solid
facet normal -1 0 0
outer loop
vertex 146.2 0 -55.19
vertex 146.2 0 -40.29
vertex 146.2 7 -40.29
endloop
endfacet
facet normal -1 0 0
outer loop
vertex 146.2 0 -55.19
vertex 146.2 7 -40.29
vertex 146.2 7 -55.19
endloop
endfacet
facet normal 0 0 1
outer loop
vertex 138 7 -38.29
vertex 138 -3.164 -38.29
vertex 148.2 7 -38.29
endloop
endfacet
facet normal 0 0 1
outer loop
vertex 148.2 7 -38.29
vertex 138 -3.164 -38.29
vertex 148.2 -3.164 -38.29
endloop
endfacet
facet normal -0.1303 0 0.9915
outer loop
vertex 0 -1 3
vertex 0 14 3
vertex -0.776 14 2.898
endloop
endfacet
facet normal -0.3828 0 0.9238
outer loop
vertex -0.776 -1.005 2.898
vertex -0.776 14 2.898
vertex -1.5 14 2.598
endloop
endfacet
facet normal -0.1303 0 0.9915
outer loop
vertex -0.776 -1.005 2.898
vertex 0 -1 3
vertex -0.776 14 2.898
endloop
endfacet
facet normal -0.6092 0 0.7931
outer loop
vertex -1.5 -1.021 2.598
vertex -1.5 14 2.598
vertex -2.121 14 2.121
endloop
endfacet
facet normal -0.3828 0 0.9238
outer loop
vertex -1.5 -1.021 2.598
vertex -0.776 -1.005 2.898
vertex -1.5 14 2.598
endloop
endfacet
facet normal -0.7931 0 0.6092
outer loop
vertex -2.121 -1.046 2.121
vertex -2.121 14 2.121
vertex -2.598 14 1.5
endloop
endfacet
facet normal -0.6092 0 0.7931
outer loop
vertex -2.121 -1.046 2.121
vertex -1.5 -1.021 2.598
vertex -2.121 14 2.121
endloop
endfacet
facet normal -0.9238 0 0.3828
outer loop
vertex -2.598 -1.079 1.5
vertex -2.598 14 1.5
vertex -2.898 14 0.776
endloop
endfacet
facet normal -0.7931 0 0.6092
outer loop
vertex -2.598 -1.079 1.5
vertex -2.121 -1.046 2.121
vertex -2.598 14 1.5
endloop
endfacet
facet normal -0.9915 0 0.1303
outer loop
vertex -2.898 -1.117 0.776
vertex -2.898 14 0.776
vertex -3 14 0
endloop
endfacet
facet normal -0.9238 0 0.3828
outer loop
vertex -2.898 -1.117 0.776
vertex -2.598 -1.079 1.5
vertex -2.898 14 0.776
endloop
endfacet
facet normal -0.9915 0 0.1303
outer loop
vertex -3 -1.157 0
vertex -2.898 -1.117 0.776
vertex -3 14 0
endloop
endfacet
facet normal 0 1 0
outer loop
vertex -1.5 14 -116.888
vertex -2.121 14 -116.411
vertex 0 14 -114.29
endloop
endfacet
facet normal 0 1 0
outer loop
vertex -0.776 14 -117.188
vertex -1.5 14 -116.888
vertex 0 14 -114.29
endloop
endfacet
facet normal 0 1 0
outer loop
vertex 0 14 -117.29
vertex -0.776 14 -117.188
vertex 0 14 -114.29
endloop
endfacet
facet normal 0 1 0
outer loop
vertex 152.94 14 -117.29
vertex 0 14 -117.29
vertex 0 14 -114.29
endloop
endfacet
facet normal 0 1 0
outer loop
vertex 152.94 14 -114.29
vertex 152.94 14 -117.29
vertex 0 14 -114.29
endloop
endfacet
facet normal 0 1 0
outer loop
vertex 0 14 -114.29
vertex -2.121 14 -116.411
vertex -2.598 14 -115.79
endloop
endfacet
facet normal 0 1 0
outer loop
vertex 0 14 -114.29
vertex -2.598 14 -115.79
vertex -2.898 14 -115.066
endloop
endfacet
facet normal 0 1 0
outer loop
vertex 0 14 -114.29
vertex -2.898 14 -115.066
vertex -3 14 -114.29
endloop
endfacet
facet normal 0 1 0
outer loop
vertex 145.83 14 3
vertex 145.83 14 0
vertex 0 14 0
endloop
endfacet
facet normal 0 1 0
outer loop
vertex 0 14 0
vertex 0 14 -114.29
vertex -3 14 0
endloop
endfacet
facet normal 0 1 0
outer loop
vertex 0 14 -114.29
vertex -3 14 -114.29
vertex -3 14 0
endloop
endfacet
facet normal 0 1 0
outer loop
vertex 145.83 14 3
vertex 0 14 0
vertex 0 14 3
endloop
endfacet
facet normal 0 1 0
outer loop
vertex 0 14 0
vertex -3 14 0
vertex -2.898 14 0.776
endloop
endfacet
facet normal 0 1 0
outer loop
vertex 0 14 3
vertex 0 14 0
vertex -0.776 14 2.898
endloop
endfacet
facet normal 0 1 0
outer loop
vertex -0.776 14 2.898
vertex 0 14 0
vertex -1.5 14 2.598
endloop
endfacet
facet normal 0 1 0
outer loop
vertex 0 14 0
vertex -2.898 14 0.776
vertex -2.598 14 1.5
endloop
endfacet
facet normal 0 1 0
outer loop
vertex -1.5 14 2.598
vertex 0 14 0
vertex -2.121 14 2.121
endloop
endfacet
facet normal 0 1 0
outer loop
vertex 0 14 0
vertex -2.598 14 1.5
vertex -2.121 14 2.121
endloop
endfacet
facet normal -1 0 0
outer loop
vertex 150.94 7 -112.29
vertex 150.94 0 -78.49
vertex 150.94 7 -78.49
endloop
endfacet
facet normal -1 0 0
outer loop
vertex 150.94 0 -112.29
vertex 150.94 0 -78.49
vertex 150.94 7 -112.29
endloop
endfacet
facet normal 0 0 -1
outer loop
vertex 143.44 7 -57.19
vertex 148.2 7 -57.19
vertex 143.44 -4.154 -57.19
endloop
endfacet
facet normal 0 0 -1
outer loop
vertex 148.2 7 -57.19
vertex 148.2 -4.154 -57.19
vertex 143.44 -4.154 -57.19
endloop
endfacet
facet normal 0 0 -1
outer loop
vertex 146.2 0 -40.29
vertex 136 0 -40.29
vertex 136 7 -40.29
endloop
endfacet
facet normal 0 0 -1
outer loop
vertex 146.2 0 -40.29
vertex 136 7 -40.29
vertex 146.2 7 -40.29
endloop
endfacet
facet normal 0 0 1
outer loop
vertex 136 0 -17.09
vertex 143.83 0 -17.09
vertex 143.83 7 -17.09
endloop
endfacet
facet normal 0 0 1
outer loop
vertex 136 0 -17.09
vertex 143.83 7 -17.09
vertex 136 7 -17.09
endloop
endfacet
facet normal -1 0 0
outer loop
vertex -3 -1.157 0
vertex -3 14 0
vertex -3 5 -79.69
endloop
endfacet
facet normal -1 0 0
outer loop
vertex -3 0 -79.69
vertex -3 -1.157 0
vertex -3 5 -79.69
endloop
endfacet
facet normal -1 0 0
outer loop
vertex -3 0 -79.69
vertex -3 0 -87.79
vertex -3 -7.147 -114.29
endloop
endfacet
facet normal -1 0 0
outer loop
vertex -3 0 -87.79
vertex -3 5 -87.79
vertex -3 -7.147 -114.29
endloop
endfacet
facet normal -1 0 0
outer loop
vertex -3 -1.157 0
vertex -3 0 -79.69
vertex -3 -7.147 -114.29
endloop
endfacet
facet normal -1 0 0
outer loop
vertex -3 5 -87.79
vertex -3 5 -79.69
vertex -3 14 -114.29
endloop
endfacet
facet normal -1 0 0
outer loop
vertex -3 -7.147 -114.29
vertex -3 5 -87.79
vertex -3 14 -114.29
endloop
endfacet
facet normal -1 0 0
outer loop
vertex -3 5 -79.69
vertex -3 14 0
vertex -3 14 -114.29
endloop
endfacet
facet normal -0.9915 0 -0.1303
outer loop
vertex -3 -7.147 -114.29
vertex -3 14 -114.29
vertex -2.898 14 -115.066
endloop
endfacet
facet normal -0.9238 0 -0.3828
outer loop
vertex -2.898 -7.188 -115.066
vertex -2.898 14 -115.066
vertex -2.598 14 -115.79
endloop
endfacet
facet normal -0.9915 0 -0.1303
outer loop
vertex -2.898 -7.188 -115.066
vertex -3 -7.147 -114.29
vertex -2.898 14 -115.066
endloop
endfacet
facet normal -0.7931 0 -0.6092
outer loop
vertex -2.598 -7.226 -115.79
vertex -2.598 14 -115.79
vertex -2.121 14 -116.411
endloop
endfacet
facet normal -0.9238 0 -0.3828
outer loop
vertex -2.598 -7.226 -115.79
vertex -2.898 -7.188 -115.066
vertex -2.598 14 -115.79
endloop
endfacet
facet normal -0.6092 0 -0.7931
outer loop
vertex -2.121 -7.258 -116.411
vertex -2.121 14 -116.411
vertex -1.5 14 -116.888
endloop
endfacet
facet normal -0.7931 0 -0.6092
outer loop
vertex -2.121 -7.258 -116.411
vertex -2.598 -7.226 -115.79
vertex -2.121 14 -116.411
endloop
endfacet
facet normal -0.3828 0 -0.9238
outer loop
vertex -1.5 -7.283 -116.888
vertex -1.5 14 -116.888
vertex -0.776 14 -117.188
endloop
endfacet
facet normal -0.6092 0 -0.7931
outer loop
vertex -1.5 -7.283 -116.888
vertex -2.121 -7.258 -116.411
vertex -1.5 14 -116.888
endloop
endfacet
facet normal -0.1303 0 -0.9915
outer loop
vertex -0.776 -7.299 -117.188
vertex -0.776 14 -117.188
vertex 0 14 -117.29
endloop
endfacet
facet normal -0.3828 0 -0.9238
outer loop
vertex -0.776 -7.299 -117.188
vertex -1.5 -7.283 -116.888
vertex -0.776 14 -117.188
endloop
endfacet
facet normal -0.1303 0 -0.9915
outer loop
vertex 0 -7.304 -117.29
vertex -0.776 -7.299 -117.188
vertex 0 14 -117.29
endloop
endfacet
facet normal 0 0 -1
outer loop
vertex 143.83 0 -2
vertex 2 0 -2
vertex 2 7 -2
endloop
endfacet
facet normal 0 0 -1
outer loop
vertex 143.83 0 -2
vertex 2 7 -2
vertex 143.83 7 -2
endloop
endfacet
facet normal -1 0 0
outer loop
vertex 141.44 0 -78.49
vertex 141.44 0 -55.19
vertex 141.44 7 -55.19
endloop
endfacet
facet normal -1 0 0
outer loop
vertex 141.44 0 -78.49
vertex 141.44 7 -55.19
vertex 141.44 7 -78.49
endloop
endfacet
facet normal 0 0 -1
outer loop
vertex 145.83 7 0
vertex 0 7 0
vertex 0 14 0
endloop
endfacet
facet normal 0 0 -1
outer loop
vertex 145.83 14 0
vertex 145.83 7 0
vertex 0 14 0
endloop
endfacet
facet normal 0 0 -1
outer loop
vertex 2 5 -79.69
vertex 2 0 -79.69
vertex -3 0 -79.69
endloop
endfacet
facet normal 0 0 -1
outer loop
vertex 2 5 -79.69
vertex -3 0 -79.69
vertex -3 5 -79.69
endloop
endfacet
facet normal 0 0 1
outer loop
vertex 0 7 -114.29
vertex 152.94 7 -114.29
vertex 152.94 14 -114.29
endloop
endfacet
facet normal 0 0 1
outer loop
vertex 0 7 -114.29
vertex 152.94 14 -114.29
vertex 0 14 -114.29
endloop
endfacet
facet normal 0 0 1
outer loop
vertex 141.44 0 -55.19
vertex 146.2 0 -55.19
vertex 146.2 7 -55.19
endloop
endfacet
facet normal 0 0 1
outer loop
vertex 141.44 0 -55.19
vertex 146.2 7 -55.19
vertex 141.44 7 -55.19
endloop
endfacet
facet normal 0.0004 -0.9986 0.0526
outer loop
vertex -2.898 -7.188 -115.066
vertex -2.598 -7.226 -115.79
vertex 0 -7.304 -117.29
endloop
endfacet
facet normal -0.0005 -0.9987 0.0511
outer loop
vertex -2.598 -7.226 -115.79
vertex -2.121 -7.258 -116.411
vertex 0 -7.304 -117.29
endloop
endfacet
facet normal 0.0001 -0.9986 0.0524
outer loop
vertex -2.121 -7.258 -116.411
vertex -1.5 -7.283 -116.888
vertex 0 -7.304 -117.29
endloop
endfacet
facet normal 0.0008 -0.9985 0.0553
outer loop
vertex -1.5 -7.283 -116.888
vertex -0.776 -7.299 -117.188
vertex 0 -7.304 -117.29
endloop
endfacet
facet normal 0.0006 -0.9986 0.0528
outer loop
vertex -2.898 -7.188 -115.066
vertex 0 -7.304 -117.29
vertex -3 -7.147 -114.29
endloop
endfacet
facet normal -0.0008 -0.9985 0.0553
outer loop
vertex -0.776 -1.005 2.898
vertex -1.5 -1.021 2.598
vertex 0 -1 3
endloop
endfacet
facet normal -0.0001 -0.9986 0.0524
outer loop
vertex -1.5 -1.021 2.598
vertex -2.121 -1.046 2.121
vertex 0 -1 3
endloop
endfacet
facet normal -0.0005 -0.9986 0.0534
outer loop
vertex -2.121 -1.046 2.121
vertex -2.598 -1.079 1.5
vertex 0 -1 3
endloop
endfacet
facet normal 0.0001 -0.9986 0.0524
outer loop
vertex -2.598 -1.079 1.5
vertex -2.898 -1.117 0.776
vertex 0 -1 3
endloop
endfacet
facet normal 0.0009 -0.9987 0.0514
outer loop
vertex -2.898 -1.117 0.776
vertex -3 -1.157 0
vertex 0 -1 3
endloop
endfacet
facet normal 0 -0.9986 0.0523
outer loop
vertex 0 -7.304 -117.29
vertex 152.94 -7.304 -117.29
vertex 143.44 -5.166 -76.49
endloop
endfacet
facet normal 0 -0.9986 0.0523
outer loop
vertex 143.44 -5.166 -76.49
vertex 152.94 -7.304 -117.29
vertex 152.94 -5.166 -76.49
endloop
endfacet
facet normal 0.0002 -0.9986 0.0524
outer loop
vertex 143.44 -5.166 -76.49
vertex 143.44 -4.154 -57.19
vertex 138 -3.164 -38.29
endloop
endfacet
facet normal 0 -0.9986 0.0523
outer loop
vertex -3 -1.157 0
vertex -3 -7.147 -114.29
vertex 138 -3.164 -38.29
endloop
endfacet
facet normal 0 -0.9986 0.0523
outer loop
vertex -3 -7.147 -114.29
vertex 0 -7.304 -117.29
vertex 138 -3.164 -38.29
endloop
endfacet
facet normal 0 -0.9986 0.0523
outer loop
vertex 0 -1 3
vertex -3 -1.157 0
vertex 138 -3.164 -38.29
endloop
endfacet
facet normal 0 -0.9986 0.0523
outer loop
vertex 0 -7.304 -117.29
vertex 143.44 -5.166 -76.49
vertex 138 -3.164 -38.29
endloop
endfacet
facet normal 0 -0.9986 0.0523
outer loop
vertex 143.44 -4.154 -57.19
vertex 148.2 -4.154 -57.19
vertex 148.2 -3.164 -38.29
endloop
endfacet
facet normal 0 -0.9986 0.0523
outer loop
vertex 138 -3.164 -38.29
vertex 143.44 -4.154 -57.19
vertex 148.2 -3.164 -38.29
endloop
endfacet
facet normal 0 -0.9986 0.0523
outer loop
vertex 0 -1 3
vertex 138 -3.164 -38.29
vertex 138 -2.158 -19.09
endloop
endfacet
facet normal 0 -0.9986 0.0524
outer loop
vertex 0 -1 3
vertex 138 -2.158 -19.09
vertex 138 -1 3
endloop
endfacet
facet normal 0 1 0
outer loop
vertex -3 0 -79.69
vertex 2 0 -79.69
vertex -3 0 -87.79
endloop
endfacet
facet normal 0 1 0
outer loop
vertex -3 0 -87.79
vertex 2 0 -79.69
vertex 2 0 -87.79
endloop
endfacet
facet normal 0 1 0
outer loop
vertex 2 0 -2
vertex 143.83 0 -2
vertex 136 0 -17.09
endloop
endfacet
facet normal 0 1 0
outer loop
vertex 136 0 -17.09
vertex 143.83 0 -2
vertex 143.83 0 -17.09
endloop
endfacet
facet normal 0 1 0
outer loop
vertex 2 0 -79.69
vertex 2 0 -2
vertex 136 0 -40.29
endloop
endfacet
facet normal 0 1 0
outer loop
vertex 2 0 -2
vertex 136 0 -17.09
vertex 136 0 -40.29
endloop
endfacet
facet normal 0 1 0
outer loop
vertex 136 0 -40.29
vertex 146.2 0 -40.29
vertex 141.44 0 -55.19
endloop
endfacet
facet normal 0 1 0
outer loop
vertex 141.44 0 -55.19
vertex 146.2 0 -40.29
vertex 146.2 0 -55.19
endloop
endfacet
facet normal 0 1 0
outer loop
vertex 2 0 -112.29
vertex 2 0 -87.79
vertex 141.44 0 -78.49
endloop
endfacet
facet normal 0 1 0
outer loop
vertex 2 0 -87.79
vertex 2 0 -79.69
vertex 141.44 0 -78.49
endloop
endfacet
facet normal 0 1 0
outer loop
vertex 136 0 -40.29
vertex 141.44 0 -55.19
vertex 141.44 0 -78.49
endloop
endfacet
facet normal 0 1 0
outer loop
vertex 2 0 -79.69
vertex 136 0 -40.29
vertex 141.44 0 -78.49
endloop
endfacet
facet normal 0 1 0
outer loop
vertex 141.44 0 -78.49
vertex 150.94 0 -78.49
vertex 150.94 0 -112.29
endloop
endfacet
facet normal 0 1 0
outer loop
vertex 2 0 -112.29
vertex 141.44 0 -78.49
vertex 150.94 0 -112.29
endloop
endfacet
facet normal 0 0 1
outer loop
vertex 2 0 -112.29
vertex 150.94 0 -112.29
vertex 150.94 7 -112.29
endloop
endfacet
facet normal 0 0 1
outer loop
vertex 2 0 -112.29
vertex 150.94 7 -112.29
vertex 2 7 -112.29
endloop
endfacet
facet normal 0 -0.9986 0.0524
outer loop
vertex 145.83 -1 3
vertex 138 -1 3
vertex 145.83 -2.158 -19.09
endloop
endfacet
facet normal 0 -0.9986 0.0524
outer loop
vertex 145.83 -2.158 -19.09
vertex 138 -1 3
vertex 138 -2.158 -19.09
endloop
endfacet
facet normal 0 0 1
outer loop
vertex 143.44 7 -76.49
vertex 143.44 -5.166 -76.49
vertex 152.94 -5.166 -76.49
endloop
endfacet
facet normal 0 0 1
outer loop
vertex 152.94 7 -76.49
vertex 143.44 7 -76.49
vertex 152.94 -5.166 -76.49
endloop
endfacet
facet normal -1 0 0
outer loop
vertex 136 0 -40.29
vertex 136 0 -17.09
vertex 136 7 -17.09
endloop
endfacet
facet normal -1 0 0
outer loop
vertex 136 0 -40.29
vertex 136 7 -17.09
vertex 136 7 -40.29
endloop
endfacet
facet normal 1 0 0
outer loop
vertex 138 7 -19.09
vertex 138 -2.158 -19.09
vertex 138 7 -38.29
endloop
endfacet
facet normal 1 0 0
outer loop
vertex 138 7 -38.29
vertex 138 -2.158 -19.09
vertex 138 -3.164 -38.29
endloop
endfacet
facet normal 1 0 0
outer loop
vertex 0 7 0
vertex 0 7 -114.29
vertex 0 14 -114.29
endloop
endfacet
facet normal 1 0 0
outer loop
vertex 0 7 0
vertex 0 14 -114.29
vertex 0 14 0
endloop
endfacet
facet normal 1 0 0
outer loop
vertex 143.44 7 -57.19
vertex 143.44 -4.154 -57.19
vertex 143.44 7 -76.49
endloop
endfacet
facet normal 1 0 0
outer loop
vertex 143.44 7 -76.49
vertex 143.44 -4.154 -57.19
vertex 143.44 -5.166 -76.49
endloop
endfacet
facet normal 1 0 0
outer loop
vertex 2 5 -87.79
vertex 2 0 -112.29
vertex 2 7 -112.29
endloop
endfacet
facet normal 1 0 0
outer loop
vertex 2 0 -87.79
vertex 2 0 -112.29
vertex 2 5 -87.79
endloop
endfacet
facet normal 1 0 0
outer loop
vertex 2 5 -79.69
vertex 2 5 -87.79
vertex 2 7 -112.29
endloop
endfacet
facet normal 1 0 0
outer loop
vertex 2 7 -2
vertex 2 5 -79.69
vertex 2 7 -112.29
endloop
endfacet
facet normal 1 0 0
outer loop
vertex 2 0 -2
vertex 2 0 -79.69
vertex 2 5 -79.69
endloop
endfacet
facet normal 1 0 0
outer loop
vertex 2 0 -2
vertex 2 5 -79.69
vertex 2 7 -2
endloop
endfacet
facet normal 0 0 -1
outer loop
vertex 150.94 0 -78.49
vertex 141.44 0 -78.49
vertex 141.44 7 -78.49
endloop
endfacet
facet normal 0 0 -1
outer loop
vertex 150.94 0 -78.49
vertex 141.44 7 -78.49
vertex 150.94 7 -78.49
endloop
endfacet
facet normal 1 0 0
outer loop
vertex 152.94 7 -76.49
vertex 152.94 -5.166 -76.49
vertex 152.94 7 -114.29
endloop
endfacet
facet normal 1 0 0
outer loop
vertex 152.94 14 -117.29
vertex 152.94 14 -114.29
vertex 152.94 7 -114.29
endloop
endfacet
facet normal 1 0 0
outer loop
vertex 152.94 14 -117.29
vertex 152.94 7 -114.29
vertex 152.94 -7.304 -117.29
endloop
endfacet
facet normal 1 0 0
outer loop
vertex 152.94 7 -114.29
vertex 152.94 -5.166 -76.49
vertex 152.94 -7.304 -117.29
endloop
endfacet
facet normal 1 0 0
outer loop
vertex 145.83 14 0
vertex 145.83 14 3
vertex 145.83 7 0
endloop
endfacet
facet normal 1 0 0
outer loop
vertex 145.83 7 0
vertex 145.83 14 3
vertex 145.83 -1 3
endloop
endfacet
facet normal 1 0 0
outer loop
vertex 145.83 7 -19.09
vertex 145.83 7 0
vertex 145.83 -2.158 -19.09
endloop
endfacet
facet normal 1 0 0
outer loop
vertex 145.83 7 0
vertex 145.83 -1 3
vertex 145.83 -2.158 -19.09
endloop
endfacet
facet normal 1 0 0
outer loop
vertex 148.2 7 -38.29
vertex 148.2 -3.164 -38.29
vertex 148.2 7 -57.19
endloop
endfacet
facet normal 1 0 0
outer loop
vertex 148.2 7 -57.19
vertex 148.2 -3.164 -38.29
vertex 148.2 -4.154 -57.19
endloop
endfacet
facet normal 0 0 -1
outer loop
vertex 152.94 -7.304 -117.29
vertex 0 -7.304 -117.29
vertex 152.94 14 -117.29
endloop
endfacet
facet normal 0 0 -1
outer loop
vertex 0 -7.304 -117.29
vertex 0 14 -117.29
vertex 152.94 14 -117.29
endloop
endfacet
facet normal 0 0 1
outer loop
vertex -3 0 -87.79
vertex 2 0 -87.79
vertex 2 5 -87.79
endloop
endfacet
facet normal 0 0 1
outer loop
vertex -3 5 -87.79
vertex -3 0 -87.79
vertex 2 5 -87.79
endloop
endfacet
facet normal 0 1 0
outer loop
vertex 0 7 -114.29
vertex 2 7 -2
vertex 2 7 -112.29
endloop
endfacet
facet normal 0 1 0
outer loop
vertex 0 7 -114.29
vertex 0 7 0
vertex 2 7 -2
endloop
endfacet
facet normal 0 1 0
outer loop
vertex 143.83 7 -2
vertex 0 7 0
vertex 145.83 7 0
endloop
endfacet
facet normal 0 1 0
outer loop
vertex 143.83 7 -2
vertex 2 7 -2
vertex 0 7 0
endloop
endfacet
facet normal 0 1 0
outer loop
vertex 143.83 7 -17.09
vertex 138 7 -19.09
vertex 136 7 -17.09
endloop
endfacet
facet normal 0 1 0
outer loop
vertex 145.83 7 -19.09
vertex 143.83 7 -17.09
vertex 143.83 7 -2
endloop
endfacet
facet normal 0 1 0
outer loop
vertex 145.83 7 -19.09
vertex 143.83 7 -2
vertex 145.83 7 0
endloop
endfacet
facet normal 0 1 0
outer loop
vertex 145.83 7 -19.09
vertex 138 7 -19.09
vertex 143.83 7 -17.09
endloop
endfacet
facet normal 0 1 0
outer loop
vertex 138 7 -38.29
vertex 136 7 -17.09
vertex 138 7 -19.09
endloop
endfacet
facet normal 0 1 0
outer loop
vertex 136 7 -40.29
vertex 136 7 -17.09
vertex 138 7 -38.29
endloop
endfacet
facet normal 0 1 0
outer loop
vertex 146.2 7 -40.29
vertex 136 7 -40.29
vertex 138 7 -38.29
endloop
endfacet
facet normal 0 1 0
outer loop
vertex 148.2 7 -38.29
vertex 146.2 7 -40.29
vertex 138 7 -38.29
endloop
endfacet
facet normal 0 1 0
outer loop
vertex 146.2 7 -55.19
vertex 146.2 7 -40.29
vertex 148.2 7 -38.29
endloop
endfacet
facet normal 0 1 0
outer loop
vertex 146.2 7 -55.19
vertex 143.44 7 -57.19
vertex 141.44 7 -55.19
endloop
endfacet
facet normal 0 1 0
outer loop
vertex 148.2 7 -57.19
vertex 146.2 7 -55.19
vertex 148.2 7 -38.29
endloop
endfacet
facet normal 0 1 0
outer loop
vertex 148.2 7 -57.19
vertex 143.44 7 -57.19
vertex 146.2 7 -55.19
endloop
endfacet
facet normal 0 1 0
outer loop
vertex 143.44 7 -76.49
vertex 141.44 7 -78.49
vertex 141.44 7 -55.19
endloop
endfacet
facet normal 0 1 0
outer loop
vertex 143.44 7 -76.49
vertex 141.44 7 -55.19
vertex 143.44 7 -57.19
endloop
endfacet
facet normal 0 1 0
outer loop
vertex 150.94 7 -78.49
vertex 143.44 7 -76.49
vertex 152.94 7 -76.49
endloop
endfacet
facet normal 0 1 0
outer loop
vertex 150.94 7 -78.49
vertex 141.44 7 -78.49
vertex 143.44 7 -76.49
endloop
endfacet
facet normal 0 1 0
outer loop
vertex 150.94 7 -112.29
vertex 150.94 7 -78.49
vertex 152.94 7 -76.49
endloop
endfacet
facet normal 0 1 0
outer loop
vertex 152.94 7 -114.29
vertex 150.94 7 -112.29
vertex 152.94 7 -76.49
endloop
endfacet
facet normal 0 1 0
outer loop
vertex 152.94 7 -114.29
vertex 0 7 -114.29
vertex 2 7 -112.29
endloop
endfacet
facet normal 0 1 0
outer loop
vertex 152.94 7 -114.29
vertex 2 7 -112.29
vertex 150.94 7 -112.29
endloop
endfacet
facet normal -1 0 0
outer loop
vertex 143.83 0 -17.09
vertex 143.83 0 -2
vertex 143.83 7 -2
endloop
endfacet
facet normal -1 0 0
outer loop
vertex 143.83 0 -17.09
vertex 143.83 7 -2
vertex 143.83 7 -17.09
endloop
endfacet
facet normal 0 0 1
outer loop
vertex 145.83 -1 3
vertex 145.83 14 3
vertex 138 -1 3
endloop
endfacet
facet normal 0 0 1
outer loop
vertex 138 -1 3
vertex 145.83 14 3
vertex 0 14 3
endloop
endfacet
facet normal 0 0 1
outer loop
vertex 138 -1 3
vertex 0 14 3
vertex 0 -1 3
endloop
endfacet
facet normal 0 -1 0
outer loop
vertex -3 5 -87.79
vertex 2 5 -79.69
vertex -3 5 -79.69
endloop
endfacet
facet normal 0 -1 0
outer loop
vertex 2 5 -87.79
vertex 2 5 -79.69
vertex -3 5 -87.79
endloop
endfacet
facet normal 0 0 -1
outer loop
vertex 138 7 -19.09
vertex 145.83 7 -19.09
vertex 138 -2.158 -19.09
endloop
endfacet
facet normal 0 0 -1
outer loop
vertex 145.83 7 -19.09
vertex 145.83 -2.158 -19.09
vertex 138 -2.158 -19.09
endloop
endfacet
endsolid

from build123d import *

# Parameters (mm, degrees)
BOSS_EXTRUDE1_DEPTH = 14
BOSS_EXTRUDE2_DEPTH = 1
BOSS_EXTRUDE3_DEPTH = 155.94
SKETCH1_5_W         = 14.94
SKETCH1_5_H         = 3
CUT_EXTRUDE1_DEPTH  = 10
BOSS_EXTRUDE4_DEPTH = 7.83
FILLET1_R           = 3
BOSS_EXTRUDE5_DEPTH = 7
SKETCH5_W           = 8.1
SKETCH5_H           = 5
CUT_EXTRUDE2_DEPTH  = 5


with BuildPart() as part:
    # Sketch1 → Boss-Extrude1 (new body)
    with BuildSketch(Plane(origin=(0, 0, 0), x_dir=(1, 0, 0), z_dir=(0, 1, 0))):
        Polygon((152.94, 117.29), (152.94, 114.29), (0, 114.29), (0, 0), (138, 0), (138, -3), (-3, -3), (-3, 117.29), align=None)
    extrude(amount=BOSS_EXTRUDE1_DEPTH)

    # Sketch1<3> → Boss-Extrude2 (add)
    with BuildSketch(Plane(origin=(0, 0, 0), x_dir=(1, 0, 0), z_dir=(0, 1, 0))):
        Polygon((138, 38.29), (138, 0), (0, 0), (0, 114.29), (152.94, 114.29), (152.94, 76.49), (143.44, 76.49), (143.44, 57.19), (148.2, 57.19), (148.2, 38.29), align=None)
        Polygon((152.94, 117.29), (152.94, 114.29), (0, 114.29), (0, 0), (138, 0), (138, -3), (-3, -3), (-3, 117.29), align=None)
    extrude(amount=-BOSS_EXTRUDE2_DEPTH)

    # Sketch2 → Boss-Extrude3 (add)
    with BuildSketch(Plane(origin=(152.94, 0, 0), x_dir=(0, 0, -1), z_dir=(1, 0, 0))):
        Polygon((117.29, 0), (117.29, -7.30413177), (-3, -1), (-3, 0), align=None)
    extrude(amount=-BOSS_EXTRUDE3_DEPTH)

    # Sketch1<5> → Cut-Extrude1 (cut)
    with BuildSketch(Plane(origin=(0, 0, 0), x_dir=(1, 0, 0), z_dir=(0, 1, 0))):
        with Locations((145.47, -1.5)):
            Rectangle(SKETCH1_5_W, SKETCH1_5_H)
        Polygon((138, 0), (152.94, 0), (152.94, 76.49), (143.44, 76.49), (143.44, 57.19), (148.2, 57.19), (148.2, 38.29), (138, 38.29), align=None)
    extrude(amount=-CUT_EXTRUDE1_DEPTH, mode=Mode.SUBTRACT)

    # Sketch3 → Boss-Extrude4 (add)
    with BuildSketch(Plane(origin=(138, 0, 0), x_dir=(0, 0, -1), z_dir=(1, 0, 0))):
        Polygon((19.09, -2.157687844), (19.09, 0), (0, 0), (0, 14), (-3, 14), (-3, -1), align=None)
    extrude(amount=BOSS_EXTRUDE4_DEPTH)

    # Fillet1
    fillet1_edges = [part.edges().sort_by_distance(p)[0] for p in [
        (-3, 6.5, 3),
        (-3, 3.347934115, -117.29),
    ]]
    fillet(fillet1_edges, radius=FILLET1_R)

    # Sketch4 → Boss-Extrude5 (add)
    with BuildSketch(Plane(origin=(0, 0, 0), x_dir=(1, 0, 0), z_dir=(0, 1, 0))):
        Polygon((0, 0), (145.83, 0), (145.83, 19.09), (138, 19.09), (138, 38.29), (148.2, 38.29), (148.2, 57.19), (143.44, 57.19), (143.44, 76.49), (152.94, 76.49), (152.94, 114.29), (0, 114.29), align=None)
        Polygon((150.94, 112.29), (2, 112.29), (2, 2), (143.83, 2), (143.83, 17.09), (136, 17.09), (136, 40.29), (146.2, 40.29), (146.2, 55.19), (141.44, 55.19), (141.44, 78.49), (150.94, 78.49), align=None, mode=Mode.SUBTRACT)
    extrude(amount=BOSS_EXTRUDE5_DEPTH)

    # Sketch5 → Cut-Extrude2 (cut)
    with BuildSketch(Plane(origin=(2, 0, 0), x_dir=(0, 0, -1), z_dir=(1, 0, 0))):
        with Locations((83.74, 2.5)):
            Rectangle(SKETCH5_W, SKETCH5_H)
    extrude(amount=-CUT_EXTRUDE2_DEPTH, mode=Mode.SUBTRACT)


solid = part.part
